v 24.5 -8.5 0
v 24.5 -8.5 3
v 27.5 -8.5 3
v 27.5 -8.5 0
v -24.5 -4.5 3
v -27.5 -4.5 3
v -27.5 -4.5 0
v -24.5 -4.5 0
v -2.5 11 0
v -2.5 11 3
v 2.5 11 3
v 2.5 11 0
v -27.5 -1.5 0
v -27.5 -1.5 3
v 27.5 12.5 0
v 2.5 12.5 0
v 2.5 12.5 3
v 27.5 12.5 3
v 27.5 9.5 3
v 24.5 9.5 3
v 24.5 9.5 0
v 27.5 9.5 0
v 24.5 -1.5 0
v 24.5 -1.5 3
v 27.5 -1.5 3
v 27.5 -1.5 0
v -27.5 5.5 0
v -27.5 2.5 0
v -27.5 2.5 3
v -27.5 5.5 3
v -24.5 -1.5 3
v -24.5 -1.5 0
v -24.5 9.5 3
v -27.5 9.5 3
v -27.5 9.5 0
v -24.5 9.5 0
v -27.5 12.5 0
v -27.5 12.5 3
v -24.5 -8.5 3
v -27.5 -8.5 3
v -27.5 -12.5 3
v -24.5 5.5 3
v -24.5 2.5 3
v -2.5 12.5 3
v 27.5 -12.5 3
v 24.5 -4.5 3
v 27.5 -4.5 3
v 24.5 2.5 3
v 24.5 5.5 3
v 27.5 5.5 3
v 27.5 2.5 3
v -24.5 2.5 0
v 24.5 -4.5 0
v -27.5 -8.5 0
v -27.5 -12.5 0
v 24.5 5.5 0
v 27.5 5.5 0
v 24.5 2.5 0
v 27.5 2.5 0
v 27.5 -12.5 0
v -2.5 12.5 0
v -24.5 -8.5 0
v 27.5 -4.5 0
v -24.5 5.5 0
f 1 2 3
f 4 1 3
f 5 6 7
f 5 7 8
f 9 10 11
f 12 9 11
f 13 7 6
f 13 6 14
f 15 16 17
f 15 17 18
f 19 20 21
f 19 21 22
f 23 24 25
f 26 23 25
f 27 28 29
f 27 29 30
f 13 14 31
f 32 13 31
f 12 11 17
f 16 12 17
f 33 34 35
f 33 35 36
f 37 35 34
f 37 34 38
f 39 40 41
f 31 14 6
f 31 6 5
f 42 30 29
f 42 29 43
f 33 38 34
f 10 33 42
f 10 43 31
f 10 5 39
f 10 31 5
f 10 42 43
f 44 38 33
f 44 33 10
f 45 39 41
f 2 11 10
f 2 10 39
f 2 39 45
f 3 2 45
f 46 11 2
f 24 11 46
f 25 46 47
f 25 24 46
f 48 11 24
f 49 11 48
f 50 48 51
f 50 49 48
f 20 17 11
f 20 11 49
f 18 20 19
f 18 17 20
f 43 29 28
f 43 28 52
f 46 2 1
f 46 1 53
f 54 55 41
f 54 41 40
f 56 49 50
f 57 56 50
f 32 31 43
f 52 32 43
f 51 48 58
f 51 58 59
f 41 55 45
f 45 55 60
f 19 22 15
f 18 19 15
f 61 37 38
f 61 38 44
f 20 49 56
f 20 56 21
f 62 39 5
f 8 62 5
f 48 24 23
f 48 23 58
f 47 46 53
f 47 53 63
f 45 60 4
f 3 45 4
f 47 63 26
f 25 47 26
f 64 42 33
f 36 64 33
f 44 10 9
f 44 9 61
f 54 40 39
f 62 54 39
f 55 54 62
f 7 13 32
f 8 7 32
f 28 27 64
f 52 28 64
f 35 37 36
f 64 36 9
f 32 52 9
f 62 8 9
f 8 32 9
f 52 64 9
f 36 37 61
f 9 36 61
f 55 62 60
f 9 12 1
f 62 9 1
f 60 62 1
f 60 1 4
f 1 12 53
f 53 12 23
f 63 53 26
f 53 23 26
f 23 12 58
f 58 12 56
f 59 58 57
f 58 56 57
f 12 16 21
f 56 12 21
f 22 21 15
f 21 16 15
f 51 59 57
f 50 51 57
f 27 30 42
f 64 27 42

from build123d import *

# Parameters (mm, degrees)
SKETCH1_W           = 55
SKETCH1_H           = 25
BOSS_EXTRUDE1_DEPTH = 3
SKETCH2_W           = 5
SKETCH2_H           = 1.5
CUT_EXTRUDE1_DEPTH  = 3
SKETCH3_W           = 3
SKETCH3_H           = 4
CUT_EXTRUDE2_DEPTH  = 3
SKETCH4_W           = 3
SKETCH4_H           = 4
CUT_EXTRUDE3_DEPTH  = 3


with BuildPart() as part:
    # Sketch1 → Boss-Extrude1 (new body)
    with BuildSketch(Plane.XY):
        Rectangle(SKETCH1_W, SKETCH1_H)
    extrude(amount=BOSS_EXTRUDE1_DEPTH)

    # Sketch2 → Cut-Extrude1 (cut)
    with BuildSketch(Plane.XY.offset(3)):
        with Locations((0, 11.75)):
            Rectangle(SKETCH2_W, SKETCH2_H)
    extrude(amount=-CUT_EXTRUDE1_DEPTH, mode=Mode.SUBTRACT)

    # Sketch3 → Cut-Extrude2 (cut)
    with BuildSketch(Plane.XY.offset(3)):
        with Locations((-26, 7.5)):
            Rectangle(SKETCH3_W, SKETCH3_H)
        with Locations((-26, 0.5)):
            Rectangle(SKETCH3_W, SKETCH3_H)
        with Locations((-26, -6.5)):
            Rectangle(SKETCH3_W, SKETCH3_H)
    extrude(amount=-CUT_EXTRUDE2_DEPTH, mode=Mode.SUBTRACT)

    # Sketch4 → Cut-Extrude3 (cut)
    with BuildSketch(Plane.XY.offset(3)):
        with Locations((26, 7.5)):
            Rectangle(SKETCH4_W, SKETCH4_H)
        with Locations((26, 0.5)):
            Rectangle(SKETCH4_W, SKETCH4_H)
        with Locations((26, -6.5)):
            Rectangle(SKETCH4_W, SKETCH4_H)
    extrude(amount=-CUT_EXTRUDE3_DEPTH, mode=Mode.SUBTRACT)


solid = part.part
